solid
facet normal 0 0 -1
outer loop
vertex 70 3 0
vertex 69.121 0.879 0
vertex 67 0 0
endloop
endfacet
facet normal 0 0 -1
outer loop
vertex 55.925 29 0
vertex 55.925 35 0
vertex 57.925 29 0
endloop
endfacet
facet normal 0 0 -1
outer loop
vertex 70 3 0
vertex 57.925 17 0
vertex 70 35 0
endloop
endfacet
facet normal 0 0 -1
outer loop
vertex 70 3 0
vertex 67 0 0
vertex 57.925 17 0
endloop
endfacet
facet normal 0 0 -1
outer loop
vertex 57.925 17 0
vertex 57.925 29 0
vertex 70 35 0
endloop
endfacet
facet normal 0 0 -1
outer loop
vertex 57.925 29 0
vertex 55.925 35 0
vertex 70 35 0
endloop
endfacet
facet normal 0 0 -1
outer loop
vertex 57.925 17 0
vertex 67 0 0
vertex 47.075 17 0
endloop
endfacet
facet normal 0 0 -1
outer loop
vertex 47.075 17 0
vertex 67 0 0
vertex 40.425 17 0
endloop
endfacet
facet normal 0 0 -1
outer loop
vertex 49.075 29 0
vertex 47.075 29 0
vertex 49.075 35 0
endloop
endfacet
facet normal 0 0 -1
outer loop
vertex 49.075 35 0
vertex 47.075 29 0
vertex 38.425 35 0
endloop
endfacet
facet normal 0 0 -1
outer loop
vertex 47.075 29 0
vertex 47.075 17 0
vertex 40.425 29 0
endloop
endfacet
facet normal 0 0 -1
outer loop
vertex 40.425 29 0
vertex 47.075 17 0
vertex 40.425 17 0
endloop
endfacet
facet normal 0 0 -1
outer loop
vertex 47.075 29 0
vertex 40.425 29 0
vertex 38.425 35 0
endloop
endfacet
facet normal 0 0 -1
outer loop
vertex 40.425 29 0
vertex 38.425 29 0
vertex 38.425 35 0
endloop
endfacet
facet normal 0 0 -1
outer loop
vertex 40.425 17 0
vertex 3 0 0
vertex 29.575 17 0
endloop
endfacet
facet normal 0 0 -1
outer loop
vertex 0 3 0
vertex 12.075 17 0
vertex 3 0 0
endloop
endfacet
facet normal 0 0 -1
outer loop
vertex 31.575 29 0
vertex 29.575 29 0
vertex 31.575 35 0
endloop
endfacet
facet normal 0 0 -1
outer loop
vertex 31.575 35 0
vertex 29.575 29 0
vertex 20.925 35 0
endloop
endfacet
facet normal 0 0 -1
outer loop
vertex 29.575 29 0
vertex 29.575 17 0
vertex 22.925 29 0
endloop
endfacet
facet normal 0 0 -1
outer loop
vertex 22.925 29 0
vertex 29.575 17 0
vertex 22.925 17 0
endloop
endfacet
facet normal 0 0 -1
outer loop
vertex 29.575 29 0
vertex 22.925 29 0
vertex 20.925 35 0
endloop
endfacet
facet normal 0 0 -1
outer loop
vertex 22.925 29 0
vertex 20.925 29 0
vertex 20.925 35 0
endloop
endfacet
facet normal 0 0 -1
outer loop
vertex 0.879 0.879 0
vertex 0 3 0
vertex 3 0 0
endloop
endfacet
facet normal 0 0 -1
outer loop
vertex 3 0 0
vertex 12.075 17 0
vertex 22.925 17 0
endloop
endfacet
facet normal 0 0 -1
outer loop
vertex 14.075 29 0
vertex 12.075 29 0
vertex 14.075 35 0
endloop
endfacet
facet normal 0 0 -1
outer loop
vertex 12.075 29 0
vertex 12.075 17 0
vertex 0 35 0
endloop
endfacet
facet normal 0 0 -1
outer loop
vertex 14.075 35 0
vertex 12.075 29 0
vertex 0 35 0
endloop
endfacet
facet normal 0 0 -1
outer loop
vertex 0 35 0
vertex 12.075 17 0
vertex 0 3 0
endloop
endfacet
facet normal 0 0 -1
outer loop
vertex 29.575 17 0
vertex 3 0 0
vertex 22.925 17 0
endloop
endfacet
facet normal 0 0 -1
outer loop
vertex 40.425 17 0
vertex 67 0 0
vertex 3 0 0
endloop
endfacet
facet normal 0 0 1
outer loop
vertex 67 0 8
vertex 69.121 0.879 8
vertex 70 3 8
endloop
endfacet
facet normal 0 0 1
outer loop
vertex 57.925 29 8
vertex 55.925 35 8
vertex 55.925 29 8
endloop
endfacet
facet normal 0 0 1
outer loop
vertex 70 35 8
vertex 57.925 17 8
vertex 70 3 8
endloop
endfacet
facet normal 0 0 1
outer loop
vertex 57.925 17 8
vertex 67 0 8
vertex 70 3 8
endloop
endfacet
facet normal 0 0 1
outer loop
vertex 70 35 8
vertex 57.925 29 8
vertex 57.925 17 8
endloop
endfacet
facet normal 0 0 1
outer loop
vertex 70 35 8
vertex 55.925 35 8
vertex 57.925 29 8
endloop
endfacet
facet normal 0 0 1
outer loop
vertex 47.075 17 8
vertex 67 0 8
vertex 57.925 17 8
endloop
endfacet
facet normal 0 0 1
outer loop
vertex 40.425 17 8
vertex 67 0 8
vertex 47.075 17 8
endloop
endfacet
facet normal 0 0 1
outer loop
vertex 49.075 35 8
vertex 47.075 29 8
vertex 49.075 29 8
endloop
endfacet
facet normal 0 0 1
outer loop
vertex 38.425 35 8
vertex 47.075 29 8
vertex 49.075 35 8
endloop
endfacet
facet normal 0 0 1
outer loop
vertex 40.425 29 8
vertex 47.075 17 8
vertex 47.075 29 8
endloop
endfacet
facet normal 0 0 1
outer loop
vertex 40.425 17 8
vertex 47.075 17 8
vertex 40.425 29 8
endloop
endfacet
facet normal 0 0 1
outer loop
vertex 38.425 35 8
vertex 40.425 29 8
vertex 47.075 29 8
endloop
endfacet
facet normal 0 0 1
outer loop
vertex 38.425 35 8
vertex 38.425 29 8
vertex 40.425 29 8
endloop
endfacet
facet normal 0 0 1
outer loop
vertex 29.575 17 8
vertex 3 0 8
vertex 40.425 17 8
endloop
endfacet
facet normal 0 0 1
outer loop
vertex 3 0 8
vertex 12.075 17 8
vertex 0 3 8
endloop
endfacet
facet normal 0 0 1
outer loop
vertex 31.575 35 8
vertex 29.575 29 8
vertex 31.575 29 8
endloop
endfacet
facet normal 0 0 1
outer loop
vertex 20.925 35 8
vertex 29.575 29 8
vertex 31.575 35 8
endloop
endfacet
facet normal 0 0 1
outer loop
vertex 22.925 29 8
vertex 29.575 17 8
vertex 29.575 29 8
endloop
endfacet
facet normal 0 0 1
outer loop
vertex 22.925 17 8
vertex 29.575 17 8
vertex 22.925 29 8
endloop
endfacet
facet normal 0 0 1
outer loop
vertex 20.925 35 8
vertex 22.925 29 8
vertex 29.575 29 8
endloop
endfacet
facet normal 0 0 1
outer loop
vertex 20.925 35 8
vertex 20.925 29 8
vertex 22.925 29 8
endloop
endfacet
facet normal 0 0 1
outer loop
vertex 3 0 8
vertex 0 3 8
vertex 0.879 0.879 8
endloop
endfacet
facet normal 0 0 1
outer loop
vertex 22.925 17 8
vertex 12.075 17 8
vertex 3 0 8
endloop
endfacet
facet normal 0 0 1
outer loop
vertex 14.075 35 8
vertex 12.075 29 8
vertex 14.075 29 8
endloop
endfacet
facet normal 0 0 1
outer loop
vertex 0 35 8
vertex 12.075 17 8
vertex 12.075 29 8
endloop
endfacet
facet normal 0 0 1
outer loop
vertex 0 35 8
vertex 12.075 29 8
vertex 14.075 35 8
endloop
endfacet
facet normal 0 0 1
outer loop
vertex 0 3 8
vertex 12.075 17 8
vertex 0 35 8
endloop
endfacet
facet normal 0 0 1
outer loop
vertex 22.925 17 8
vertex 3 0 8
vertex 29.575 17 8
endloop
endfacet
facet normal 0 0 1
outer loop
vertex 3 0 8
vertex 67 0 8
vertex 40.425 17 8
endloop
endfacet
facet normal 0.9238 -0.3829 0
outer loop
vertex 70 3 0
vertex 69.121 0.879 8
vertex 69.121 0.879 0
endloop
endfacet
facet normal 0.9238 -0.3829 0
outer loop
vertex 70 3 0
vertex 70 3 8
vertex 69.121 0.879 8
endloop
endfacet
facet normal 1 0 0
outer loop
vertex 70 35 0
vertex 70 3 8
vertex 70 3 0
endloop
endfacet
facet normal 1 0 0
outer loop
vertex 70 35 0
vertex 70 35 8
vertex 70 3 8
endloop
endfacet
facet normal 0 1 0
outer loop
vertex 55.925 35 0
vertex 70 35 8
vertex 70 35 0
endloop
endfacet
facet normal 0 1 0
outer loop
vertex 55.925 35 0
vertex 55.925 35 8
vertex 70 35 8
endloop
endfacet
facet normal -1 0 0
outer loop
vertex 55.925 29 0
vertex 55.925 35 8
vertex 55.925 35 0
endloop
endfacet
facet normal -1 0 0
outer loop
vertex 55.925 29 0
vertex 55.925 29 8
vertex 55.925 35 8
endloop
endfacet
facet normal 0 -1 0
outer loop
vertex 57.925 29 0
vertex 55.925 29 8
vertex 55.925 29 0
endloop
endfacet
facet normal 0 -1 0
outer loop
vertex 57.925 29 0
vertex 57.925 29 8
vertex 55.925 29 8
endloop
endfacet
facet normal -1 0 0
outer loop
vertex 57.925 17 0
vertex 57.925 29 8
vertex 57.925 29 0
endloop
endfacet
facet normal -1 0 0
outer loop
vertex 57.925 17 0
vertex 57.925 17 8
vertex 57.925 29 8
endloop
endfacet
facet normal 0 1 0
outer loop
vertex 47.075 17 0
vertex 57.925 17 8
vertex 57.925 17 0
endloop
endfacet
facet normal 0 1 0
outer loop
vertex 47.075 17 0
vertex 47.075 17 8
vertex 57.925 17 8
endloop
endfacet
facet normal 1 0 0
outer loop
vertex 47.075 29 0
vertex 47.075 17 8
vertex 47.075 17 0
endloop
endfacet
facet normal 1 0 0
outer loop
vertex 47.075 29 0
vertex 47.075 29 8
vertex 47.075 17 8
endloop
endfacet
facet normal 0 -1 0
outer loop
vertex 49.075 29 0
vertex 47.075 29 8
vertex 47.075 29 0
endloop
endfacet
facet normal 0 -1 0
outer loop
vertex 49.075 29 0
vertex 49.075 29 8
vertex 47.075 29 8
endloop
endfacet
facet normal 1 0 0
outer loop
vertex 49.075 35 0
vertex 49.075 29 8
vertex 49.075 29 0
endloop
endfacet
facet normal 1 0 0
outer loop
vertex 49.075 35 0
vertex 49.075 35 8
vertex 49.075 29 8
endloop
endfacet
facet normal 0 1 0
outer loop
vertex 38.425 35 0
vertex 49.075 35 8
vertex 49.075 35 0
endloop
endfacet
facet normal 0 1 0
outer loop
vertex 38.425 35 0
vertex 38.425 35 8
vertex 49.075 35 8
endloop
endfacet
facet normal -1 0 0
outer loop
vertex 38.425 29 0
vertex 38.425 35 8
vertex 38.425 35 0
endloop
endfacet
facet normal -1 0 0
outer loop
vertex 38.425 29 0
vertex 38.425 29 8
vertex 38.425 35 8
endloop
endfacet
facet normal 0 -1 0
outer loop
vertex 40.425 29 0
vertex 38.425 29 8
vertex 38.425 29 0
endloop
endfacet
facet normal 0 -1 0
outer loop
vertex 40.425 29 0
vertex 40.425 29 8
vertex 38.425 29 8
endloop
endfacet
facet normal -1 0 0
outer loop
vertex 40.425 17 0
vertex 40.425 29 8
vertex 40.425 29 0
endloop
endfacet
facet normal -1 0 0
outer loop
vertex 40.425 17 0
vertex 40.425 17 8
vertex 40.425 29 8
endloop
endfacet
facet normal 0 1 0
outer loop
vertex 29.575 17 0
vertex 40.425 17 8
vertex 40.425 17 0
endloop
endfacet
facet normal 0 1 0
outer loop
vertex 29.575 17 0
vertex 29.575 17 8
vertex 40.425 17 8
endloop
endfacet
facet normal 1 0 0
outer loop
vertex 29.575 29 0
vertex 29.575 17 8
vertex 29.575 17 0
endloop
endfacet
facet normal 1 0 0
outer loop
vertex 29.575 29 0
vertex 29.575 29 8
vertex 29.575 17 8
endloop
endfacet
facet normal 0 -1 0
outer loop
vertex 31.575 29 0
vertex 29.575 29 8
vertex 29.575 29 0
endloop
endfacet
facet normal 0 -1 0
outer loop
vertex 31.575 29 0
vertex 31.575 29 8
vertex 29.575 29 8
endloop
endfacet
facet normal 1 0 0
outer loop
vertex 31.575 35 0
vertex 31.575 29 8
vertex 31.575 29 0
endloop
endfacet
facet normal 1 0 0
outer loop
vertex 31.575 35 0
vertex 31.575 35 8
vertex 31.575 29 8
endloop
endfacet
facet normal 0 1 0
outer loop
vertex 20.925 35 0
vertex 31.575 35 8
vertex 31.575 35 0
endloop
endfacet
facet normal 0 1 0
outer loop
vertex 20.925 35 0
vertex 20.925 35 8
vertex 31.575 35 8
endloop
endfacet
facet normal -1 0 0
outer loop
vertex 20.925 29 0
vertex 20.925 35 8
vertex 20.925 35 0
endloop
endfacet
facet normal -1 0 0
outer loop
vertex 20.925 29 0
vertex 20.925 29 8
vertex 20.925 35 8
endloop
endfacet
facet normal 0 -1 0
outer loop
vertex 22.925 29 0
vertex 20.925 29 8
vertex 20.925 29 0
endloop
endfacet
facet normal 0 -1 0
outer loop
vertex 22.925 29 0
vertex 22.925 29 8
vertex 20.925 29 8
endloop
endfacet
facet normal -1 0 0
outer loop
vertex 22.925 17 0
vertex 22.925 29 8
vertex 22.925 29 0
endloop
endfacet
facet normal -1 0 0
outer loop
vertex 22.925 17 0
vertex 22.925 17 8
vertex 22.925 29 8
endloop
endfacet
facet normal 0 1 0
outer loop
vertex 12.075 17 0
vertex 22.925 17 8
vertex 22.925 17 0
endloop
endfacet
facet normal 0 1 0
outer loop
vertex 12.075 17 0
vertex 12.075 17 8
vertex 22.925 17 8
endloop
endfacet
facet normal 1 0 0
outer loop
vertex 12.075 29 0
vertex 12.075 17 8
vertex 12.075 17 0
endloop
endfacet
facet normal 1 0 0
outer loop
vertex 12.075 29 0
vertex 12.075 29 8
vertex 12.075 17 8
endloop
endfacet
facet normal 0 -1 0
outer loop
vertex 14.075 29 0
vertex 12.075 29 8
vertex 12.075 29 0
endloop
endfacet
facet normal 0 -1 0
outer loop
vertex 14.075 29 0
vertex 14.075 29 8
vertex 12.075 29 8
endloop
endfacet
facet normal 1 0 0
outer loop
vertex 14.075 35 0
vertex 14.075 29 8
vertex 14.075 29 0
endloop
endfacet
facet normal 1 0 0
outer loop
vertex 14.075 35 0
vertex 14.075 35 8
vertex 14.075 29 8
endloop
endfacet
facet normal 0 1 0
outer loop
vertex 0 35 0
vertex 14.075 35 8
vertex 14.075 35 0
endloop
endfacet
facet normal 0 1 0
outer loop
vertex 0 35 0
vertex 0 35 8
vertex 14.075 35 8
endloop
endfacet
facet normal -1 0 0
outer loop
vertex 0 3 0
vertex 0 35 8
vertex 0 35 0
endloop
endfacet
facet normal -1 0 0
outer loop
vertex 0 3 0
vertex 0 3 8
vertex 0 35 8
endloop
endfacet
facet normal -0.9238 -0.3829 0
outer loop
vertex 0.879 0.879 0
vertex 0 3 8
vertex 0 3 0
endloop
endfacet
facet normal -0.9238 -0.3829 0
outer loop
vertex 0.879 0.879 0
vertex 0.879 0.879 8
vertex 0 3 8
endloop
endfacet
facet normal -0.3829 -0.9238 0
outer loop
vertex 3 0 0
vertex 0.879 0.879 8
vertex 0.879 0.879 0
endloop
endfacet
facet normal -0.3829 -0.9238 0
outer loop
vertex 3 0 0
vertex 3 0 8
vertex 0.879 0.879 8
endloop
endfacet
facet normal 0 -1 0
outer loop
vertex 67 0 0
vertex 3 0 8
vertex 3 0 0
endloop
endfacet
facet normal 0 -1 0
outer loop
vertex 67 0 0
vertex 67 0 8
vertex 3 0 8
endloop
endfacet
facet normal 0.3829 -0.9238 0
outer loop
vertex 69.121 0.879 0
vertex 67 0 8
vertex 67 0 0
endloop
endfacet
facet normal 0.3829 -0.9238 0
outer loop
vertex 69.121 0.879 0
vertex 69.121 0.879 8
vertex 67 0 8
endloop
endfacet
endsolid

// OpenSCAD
$fn = 32;

// ----------------------------------------------------------------------
// Window plate: 70 x 35 mm, 3 open windows
// ----------------------------------------------------------------------

// --- parameters (mm) ---
profile_height = 8;       // extrusion height
profile_points = 32;      // points of the closed outline

profile = [[0, 3], [0.879, 0.879], [3, 0], [67, 0], [69.121, 0.879], [70, 3], [70, 35], [55.925, 35], [55.925, 29], [57.925, 29], [57.925, 17], [47.075, 17], [47.075, 29], [49.075, 29], [49.075, 35], [38.425, 35], [38.425, 29], [40.425, 29], [40.425, 17], [29.575, 17], [29.575, 29], [31.575, 29], [31.575, 35], [20.925, 35], [20.925, 29], [22.925, 29], [22.925, 17], [12.075, 17], [12.075, 29], [14.075, 29], [14.075, 35], [0, 35]];  // single closed polygon, 32 points, counter clockwise

// --- the one profile operation ---
linear_extrude(height = profile_height) polygon(points = profile);
